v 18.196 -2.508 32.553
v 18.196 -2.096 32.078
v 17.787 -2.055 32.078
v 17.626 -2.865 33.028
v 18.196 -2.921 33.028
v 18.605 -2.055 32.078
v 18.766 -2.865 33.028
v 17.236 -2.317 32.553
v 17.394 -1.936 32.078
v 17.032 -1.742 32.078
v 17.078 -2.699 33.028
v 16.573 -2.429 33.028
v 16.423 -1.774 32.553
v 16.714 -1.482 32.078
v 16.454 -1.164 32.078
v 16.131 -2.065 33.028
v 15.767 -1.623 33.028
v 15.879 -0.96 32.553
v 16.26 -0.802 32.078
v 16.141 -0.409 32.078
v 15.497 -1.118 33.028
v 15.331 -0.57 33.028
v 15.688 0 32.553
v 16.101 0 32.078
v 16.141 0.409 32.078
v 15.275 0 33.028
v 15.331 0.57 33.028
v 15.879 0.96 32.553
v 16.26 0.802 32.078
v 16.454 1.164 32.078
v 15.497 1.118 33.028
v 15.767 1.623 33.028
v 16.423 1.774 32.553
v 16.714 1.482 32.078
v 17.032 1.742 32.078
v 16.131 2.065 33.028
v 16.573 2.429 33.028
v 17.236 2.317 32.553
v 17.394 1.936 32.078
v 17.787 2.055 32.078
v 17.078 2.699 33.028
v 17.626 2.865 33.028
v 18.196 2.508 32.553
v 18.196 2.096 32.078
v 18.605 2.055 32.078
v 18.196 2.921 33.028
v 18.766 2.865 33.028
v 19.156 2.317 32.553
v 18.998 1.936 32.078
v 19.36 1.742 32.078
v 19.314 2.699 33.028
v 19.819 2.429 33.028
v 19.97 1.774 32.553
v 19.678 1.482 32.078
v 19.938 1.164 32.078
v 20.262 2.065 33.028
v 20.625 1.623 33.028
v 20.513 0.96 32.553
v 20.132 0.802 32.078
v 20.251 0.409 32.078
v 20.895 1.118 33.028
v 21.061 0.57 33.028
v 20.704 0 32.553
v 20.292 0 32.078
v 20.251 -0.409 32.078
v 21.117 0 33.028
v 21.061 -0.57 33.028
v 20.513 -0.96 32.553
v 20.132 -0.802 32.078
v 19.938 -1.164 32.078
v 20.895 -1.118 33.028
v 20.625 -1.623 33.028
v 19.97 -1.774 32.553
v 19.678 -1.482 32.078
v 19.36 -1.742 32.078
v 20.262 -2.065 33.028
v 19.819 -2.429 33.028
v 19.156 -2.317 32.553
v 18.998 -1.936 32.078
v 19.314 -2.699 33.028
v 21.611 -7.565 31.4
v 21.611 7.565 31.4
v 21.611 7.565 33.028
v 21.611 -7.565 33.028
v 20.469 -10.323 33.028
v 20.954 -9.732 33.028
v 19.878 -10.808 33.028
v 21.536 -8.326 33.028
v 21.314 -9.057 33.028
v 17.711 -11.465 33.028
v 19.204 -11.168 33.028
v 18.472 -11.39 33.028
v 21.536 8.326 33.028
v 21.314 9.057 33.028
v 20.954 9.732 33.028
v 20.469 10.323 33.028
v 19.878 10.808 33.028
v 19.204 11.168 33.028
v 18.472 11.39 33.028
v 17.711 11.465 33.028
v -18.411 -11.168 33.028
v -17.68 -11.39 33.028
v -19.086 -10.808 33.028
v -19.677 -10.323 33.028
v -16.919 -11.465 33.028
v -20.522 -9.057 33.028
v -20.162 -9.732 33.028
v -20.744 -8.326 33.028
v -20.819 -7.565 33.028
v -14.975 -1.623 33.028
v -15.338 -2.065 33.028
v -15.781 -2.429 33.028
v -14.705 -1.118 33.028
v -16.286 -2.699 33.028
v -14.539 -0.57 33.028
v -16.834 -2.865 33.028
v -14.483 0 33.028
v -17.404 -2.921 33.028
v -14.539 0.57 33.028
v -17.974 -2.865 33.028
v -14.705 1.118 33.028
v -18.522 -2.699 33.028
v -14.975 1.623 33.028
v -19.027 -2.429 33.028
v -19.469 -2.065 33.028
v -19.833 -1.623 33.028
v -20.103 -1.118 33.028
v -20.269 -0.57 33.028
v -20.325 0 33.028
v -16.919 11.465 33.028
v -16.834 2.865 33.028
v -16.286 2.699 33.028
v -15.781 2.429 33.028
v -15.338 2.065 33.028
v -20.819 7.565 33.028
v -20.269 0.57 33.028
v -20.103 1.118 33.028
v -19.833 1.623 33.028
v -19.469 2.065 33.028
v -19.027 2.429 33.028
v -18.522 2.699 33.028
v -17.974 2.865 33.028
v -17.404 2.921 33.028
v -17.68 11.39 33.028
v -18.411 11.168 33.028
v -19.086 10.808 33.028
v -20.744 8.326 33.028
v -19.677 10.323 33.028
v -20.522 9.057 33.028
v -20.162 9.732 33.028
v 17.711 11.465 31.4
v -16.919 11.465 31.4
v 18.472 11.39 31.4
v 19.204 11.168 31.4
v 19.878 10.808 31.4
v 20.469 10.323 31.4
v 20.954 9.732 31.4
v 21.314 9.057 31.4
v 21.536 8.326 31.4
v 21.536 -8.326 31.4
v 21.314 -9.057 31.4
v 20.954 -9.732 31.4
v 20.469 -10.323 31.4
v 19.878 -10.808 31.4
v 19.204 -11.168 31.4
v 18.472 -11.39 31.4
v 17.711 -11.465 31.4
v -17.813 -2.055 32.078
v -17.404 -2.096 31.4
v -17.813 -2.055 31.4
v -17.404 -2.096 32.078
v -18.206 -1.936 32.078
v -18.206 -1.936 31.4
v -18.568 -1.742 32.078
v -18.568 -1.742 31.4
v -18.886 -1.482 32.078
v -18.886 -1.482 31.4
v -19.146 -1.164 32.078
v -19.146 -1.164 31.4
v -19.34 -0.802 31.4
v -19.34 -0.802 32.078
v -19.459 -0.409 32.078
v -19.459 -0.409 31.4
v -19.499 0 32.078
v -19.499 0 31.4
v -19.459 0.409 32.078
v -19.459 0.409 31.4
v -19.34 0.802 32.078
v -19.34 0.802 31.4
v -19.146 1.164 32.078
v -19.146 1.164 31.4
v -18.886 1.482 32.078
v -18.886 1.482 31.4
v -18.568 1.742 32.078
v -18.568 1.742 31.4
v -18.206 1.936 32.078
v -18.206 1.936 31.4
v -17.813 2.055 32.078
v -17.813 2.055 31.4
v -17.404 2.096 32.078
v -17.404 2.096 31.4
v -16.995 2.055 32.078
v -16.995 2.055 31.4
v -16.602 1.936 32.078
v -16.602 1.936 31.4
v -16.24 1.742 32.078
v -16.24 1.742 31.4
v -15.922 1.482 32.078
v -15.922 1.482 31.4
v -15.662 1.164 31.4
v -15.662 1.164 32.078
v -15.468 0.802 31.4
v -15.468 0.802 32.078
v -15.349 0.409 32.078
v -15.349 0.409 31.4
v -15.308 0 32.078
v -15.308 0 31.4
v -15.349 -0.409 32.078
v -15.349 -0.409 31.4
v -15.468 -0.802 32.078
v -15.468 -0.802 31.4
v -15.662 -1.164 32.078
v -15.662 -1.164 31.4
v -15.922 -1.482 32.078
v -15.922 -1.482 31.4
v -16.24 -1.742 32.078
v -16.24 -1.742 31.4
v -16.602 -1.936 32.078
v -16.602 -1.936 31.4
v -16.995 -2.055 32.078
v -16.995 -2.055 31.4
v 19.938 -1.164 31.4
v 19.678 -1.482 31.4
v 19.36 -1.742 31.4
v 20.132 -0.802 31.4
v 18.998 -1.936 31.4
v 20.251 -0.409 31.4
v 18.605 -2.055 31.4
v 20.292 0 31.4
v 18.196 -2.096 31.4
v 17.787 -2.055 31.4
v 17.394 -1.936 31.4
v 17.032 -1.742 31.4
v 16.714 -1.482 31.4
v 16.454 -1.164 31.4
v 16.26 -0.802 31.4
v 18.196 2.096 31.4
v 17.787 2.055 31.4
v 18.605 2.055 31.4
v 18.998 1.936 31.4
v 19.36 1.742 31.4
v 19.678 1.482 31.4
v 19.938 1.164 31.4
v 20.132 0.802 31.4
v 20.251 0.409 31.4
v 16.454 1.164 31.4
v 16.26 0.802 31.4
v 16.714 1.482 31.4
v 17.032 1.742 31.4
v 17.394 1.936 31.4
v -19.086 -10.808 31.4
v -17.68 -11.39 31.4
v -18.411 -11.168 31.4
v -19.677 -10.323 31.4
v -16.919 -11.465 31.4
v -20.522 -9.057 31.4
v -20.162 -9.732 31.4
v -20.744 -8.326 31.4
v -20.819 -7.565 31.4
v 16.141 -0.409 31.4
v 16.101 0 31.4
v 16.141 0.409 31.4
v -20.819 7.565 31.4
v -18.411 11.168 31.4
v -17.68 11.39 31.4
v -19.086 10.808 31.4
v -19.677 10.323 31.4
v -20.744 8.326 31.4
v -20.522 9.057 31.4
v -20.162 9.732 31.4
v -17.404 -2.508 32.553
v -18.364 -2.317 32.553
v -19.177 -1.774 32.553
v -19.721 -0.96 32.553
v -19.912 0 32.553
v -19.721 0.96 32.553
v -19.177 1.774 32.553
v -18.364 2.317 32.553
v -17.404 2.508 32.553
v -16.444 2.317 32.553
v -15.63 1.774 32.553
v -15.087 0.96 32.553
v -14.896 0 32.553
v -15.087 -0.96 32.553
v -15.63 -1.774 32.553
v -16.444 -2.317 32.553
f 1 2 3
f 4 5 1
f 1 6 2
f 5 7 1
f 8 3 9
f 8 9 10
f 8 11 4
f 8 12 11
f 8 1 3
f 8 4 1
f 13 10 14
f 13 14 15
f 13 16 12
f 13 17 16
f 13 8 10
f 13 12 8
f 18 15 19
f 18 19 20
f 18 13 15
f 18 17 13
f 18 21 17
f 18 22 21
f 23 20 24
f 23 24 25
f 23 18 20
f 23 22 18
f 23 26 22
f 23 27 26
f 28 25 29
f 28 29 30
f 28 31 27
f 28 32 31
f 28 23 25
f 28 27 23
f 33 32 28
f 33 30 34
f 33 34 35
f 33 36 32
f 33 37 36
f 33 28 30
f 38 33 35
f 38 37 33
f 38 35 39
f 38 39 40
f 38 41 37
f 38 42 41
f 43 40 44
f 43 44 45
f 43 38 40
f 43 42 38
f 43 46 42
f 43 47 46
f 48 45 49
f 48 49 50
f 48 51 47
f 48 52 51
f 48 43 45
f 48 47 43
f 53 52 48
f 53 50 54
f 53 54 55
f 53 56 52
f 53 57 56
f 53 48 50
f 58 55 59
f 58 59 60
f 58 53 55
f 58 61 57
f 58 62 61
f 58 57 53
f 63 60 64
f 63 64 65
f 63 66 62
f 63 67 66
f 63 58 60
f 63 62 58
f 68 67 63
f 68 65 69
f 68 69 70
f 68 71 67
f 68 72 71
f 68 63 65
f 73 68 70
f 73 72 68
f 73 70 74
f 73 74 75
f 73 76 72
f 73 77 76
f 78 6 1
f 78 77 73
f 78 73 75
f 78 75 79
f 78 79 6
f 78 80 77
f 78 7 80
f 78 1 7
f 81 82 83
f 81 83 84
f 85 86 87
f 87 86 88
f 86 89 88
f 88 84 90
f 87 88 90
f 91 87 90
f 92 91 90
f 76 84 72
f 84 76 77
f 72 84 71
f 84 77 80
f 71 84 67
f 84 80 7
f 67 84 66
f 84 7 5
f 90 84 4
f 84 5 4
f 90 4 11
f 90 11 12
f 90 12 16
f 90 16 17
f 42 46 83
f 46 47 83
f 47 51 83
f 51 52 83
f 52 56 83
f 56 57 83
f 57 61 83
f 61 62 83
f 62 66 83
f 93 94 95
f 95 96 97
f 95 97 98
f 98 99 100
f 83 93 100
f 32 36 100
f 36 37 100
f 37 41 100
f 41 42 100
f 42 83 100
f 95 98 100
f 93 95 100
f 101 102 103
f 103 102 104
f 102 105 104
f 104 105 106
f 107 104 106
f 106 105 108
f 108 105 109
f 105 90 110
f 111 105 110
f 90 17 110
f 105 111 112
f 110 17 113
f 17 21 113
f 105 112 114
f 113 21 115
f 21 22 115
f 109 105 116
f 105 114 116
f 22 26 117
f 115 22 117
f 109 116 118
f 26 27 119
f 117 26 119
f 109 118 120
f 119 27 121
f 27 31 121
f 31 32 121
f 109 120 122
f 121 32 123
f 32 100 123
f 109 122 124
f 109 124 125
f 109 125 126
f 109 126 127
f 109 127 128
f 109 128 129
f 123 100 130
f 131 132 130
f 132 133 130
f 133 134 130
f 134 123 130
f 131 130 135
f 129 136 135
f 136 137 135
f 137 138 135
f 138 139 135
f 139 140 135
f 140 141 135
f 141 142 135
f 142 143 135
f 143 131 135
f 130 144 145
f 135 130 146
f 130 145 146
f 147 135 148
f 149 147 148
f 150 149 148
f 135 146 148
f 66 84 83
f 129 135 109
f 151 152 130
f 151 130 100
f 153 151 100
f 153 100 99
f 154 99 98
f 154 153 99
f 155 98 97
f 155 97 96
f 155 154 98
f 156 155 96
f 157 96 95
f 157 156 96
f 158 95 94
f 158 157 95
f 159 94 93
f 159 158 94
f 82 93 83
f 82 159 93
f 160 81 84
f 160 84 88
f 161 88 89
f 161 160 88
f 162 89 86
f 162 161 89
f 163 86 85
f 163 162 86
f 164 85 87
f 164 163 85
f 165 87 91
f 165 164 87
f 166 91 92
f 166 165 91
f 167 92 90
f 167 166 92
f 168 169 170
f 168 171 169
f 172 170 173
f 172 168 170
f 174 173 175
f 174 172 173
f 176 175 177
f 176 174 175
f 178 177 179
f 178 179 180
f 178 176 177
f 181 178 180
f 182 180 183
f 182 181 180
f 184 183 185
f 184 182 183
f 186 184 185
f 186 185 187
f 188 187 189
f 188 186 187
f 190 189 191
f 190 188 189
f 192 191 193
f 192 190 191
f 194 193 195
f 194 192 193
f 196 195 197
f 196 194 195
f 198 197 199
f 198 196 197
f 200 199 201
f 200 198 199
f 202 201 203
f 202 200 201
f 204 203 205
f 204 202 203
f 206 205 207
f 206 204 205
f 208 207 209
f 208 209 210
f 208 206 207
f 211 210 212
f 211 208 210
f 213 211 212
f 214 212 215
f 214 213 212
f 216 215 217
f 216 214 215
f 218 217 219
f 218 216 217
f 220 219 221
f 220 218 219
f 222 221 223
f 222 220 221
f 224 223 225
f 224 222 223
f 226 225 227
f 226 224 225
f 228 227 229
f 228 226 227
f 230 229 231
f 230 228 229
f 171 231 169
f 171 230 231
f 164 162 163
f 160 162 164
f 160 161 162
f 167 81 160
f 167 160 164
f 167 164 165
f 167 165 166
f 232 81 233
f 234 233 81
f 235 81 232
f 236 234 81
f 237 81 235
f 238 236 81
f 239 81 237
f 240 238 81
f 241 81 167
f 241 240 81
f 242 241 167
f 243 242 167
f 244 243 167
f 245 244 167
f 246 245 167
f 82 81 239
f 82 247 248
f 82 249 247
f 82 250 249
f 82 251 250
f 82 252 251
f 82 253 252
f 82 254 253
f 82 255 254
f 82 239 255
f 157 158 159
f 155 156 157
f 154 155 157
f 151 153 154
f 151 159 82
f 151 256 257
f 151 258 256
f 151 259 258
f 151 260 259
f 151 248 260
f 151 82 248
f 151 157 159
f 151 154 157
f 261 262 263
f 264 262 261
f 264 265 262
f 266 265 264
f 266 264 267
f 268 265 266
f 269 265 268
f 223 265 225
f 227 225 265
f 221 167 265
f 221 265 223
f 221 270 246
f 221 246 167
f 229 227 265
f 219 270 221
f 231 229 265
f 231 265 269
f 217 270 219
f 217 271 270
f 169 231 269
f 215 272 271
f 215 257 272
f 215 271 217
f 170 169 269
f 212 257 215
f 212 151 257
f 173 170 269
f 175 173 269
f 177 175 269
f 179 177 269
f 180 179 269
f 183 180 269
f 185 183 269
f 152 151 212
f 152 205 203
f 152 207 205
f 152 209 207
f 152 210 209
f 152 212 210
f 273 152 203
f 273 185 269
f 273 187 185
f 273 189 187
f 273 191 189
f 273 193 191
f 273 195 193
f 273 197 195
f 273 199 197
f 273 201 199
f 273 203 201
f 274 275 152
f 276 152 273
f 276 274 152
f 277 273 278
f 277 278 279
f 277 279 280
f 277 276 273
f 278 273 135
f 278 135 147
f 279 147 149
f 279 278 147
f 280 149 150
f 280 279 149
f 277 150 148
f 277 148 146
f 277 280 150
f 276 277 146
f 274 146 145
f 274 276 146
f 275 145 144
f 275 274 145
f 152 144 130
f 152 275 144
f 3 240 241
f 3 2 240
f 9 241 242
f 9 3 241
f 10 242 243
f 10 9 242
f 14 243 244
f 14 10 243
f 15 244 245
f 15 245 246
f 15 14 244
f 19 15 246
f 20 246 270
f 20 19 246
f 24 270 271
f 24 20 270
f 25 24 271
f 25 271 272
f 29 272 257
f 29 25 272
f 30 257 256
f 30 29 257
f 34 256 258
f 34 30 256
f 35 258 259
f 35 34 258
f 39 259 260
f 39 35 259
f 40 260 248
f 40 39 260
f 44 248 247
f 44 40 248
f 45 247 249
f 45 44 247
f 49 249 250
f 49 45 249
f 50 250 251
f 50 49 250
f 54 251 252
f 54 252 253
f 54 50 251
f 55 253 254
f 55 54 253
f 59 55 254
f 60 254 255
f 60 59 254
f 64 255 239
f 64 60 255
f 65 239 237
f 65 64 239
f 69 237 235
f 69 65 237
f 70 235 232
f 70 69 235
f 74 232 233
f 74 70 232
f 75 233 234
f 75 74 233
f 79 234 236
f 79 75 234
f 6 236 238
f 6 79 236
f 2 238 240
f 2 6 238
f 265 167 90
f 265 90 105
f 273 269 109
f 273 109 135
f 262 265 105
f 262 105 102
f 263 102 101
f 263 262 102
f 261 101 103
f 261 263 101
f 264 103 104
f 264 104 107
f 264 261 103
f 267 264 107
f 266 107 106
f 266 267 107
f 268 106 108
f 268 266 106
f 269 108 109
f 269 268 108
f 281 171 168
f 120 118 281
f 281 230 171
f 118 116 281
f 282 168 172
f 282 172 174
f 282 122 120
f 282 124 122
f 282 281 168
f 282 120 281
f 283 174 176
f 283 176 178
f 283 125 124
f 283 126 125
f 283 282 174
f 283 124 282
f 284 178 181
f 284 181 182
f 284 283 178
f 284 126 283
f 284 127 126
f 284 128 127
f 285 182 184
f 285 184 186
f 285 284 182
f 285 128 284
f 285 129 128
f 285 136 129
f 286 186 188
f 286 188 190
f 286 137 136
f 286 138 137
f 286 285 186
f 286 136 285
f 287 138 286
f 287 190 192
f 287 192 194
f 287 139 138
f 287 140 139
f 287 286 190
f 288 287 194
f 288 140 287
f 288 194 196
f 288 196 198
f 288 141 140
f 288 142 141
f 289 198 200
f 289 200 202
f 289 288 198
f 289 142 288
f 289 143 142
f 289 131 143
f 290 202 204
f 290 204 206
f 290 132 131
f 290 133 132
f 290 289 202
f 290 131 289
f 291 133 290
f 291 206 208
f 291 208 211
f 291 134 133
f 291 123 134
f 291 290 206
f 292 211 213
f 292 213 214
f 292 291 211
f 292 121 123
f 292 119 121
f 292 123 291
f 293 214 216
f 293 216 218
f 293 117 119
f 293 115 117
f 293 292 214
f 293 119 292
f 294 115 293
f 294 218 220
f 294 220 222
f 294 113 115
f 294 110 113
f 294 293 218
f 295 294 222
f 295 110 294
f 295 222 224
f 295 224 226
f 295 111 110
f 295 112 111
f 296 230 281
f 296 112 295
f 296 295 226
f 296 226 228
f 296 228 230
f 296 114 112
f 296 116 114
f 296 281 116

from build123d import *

# Parameters (mm, degrees)
BOSS_EXTRUDE1_DEPTH                            = 1.62814
CSK_FOR_M3_5_FLAT_HEAD_MACHINE_SCREW1_AT_COUNT = 2
CSK_FOR_M3_5_FLAT_HEAD_MACHINE_SCREW1_AT_PITCH = 35.6


with BuildPart() as part:
    # Sketch1 → Boss-Extrude1 (new body)
    with BuildSketch(Plane(origin=(0, 0, 31.399786773), x_dir=(-1, 0, 0), z_dir=(0, 0, -1))):
        with BuildLine():
            Line((16.918894582, 11.465), (-17.711105418, 11.465))
            ThreePointArc((-17.711105418, 11.465), (-20.468821865, 10.322716447), (-21.611105418, 7.565))
            Line((-21.611105418, 7.565), (-21.611105418, -7.565))
            ThreePointArc((-21.611105418, -7.565), (-20.468821865, -10.322716447), (-17.711105418, -11.465))
            Line((-17.711105418, -11.465), (16.918894582, -11.465))
            ThreePointArc((16.918894582, -11.465), (19.676611029, -10.322716447), (20.818894582, -7.565))
            Line((20.818894582, -7.565), (20.818894582, 7.565))
            ThreePointArc((20.818894582, 7.565), (19.676611029, 10.322716447), (16.918894582, 11.465))
        make_face()
    extrude(amount=-BOSS_EXTRUDE1_DEPTH)

    # Sketch2 → CSK for M3.5 Flat Head Machine Screw1 (revolve, cut)
    with BuildSketch(Plane(origin=(-17.403894582, 0, 33.027926773), x_dir=(0, -1, 0), z_dir=(1, 0, 0))):
        Polygon((0, 0), (0, 1.62814), (2.0955, 1.62814), (2.0955, 0.94962912), (2.921, 0), align=None)
    csk_for_m3_5_flat_head_machine_screw1 = revolve(axis=Axis((-17.403894582, 0, 39.377926773), (0, 0, -1)), mode=Mode.SUBTRACT)

    # CSK for M3.5 Flat Head Machine Screw1 at: CSK for M3.5 Flat Head Machine Screw1 ×2
    with Locations(*[(i * CSK_FOR_M3_5_FLAT_HEAD_MACHINE_SCREW1_AT_PITCH, 0, 0) for i in range(1, CSK_FOR_M3_5_FLAT_HEAD_MACHINE_SCREW1_AT_COUNT)]):
        add(csk_for_m3_5_flat_head_machine_screw1, mode=Mode.SUBTRACT)


solid = part.part
